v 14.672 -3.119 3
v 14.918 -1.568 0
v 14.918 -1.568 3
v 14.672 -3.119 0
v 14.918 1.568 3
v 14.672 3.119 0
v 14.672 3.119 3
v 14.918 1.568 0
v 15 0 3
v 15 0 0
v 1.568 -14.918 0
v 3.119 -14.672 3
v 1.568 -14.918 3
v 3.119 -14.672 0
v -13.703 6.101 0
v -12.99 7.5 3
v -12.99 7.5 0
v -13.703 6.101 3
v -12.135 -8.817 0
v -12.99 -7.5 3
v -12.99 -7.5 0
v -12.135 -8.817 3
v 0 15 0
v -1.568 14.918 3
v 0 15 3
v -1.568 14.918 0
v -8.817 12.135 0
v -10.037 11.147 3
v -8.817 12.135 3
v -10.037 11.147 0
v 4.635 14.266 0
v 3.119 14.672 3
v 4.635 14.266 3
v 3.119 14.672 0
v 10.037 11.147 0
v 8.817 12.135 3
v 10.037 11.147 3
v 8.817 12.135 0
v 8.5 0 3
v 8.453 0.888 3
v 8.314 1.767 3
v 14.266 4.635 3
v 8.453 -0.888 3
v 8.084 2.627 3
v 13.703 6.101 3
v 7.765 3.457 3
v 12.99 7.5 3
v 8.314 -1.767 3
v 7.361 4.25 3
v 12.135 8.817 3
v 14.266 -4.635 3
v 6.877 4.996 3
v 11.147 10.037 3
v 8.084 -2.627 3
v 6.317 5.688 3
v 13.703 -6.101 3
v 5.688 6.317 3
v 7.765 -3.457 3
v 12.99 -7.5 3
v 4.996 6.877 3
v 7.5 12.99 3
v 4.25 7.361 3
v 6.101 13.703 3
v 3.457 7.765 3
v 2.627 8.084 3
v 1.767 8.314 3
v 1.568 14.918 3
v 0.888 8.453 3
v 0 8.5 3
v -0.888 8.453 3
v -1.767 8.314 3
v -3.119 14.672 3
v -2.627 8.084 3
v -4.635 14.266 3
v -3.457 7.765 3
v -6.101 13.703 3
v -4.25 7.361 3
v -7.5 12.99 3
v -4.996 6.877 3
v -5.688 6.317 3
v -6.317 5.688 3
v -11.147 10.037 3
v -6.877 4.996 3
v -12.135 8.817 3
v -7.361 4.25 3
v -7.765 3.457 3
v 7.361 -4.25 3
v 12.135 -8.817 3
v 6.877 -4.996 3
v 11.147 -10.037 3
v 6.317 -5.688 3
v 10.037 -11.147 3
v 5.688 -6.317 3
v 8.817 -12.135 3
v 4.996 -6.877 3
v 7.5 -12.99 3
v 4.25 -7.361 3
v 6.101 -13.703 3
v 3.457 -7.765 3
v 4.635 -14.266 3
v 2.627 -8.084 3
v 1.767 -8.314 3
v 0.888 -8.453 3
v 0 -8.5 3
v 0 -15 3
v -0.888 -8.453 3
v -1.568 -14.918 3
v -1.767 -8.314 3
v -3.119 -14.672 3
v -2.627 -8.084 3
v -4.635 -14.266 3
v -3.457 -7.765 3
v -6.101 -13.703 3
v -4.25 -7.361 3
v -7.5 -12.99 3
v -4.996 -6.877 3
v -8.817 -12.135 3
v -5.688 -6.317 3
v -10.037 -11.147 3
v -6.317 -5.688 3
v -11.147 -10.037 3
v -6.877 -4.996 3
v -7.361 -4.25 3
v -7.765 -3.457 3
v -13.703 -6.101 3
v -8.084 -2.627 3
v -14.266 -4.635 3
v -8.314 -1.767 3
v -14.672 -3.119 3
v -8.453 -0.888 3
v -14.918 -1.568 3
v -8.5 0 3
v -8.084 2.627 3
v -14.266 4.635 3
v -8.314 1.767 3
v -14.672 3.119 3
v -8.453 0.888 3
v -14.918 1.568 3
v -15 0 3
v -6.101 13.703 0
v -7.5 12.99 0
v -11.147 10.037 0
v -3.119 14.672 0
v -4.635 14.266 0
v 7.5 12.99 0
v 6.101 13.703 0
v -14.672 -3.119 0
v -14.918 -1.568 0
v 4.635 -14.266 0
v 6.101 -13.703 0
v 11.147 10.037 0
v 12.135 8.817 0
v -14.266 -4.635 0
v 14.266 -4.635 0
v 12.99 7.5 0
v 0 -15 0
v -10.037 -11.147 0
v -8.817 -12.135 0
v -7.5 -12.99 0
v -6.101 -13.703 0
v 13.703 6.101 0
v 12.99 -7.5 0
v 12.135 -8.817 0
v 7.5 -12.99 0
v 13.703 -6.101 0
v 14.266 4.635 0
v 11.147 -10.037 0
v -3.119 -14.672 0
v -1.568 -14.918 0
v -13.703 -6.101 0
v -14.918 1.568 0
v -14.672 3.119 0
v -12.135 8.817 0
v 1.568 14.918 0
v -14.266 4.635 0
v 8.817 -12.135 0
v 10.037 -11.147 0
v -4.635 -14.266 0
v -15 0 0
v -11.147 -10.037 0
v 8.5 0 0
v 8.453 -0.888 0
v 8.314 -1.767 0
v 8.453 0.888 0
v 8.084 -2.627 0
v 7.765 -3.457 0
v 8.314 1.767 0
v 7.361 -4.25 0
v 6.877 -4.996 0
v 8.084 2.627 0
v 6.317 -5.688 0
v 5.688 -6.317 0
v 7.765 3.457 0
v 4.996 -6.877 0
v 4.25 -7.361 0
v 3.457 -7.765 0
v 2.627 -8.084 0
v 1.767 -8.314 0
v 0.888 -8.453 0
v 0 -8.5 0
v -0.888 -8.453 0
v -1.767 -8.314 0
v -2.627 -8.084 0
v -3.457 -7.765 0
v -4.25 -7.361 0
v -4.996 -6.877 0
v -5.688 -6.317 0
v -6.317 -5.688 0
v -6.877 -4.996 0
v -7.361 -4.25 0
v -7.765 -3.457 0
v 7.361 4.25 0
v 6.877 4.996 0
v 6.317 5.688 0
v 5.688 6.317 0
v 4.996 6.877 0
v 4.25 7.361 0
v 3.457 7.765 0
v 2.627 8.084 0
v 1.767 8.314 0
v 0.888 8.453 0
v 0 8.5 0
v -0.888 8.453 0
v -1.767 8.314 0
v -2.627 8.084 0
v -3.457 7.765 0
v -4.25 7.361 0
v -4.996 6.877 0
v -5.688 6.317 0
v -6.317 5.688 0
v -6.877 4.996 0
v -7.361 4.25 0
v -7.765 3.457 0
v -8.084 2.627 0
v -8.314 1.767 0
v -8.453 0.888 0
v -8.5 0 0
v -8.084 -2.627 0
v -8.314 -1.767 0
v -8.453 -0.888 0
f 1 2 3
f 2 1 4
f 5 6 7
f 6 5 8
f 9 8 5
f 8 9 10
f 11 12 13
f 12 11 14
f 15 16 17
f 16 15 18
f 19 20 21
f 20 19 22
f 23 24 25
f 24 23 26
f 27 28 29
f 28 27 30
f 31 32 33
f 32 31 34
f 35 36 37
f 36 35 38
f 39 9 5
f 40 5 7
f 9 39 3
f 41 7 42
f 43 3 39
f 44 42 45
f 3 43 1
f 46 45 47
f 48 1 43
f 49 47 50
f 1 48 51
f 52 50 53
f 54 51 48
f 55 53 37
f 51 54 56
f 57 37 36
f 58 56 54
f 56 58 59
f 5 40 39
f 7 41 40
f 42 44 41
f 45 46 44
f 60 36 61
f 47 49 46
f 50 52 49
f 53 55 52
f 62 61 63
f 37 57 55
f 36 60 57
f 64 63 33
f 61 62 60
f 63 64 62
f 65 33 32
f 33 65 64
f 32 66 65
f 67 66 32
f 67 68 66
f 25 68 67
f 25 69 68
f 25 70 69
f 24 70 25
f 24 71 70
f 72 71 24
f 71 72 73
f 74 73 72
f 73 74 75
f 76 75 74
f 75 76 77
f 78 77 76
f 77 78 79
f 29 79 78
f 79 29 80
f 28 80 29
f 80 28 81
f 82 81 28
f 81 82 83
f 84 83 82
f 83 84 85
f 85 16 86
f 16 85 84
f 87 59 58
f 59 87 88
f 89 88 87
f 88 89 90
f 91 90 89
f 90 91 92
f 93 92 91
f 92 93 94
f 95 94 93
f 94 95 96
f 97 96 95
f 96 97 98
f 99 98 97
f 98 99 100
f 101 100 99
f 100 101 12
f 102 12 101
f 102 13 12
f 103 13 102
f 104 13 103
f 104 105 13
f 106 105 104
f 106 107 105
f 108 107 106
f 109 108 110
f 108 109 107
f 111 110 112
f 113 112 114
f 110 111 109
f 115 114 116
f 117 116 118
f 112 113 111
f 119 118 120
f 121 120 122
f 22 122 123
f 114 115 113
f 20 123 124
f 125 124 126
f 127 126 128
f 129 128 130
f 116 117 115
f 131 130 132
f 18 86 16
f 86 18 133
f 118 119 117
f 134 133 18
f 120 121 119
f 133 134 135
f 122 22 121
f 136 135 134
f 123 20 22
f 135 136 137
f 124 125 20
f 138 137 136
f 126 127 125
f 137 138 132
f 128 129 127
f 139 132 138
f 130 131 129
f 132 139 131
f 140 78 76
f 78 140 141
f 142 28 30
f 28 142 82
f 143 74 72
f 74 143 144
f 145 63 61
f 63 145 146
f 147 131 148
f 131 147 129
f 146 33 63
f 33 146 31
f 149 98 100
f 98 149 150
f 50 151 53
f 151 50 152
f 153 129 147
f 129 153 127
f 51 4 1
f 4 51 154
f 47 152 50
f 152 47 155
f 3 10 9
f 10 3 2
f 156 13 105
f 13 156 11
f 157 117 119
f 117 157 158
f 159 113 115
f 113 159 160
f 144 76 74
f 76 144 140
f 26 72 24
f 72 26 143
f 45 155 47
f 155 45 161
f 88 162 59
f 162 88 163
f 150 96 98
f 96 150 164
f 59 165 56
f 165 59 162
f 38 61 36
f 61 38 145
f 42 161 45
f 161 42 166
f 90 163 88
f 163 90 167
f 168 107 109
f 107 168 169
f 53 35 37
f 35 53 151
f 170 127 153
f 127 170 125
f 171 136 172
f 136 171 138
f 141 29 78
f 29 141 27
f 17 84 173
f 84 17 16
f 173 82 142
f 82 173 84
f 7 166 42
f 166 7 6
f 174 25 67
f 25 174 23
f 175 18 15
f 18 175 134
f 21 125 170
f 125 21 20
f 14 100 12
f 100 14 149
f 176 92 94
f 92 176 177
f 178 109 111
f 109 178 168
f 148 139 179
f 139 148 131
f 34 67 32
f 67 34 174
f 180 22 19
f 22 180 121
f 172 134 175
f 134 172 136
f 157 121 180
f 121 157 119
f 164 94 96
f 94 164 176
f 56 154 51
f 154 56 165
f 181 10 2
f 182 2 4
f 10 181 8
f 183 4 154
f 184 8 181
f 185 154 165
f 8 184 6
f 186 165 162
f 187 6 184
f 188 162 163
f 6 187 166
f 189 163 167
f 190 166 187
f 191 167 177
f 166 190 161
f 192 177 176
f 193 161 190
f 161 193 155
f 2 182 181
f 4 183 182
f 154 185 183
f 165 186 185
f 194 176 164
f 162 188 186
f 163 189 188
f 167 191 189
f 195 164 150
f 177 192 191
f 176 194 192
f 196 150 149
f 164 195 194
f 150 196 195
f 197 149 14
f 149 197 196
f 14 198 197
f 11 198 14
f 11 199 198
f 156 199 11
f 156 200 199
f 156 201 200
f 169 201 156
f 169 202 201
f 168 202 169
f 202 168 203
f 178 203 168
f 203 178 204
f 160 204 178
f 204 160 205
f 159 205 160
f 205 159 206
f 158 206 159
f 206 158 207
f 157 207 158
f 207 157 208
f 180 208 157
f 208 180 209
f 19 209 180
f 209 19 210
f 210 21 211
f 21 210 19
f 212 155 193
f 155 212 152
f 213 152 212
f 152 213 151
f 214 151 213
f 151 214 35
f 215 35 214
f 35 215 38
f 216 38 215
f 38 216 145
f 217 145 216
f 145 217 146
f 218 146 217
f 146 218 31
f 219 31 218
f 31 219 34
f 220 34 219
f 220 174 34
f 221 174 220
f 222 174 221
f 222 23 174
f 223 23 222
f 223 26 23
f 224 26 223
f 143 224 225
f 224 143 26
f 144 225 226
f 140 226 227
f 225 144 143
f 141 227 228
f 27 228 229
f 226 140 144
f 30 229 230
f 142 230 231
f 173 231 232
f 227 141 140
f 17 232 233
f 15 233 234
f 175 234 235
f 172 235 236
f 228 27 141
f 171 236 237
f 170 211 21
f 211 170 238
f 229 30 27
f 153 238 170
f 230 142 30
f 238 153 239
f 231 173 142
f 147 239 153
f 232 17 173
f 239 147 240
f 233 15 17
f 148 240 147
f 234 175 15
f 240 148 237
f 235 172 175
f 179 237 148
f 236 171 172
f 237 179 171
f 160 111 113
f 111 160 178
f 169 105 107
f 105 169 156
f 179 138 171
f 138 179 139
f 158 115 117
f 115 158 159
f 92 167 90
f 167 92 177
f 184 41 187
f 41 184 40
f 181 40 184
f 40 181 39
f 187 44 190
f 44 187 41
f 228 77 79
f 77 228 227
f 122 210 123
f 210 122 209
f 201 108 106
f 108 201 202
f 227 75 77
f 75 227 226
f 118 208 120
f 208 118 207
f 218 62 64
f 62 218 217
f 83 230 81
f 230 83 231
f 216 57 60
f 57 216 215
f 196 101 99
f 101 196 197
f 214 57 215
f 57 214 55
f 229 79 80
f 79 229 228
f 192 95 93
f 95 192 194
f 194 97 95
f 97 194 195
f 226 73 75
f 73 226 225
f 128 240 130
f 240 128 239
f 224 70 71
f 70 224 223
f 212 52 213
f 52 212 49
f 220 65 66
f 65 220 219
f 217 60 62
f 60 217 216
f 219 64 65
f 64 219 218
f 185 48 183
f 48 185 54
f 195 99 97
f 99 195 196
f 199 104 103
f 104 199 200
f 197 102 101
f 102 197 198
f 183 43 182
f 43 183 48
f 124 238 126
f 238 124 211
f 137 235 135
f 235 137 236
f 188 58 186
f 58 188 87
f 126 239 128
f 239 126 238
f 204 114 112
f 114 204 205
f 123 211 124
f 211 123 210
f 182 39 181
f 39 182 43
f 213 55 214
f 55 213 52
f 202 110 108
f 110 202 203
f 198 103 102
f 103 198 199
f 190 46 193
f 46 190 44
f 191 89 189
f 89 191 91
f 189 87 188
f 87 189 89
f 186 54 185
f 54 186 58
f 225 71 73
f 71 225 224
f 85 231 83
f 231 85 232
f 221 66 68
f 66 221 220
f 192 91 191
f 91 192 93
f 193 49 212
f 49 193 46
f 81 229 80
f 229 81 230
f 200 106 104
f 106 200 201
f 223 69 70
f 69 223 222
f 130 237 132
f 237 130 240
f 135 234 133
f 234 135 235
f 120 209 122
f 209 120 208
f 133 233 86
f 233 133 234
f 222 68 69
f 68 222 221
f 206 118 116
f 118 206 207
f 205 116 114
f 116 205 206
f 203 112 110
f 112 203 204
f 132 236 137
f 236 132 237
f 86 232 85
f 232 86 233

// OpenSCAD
// Flat metric washer.
$fn = 60;
eps = 0.02;
inner_d = 17;
outer_d = 30;
thickness = 3;
difference() {
    cylinder(d = outer_d, h = thickness);
    translate([0, 0, -eps]) cylinder(d = inner_d, h = thickness + 2 * eps);
}
